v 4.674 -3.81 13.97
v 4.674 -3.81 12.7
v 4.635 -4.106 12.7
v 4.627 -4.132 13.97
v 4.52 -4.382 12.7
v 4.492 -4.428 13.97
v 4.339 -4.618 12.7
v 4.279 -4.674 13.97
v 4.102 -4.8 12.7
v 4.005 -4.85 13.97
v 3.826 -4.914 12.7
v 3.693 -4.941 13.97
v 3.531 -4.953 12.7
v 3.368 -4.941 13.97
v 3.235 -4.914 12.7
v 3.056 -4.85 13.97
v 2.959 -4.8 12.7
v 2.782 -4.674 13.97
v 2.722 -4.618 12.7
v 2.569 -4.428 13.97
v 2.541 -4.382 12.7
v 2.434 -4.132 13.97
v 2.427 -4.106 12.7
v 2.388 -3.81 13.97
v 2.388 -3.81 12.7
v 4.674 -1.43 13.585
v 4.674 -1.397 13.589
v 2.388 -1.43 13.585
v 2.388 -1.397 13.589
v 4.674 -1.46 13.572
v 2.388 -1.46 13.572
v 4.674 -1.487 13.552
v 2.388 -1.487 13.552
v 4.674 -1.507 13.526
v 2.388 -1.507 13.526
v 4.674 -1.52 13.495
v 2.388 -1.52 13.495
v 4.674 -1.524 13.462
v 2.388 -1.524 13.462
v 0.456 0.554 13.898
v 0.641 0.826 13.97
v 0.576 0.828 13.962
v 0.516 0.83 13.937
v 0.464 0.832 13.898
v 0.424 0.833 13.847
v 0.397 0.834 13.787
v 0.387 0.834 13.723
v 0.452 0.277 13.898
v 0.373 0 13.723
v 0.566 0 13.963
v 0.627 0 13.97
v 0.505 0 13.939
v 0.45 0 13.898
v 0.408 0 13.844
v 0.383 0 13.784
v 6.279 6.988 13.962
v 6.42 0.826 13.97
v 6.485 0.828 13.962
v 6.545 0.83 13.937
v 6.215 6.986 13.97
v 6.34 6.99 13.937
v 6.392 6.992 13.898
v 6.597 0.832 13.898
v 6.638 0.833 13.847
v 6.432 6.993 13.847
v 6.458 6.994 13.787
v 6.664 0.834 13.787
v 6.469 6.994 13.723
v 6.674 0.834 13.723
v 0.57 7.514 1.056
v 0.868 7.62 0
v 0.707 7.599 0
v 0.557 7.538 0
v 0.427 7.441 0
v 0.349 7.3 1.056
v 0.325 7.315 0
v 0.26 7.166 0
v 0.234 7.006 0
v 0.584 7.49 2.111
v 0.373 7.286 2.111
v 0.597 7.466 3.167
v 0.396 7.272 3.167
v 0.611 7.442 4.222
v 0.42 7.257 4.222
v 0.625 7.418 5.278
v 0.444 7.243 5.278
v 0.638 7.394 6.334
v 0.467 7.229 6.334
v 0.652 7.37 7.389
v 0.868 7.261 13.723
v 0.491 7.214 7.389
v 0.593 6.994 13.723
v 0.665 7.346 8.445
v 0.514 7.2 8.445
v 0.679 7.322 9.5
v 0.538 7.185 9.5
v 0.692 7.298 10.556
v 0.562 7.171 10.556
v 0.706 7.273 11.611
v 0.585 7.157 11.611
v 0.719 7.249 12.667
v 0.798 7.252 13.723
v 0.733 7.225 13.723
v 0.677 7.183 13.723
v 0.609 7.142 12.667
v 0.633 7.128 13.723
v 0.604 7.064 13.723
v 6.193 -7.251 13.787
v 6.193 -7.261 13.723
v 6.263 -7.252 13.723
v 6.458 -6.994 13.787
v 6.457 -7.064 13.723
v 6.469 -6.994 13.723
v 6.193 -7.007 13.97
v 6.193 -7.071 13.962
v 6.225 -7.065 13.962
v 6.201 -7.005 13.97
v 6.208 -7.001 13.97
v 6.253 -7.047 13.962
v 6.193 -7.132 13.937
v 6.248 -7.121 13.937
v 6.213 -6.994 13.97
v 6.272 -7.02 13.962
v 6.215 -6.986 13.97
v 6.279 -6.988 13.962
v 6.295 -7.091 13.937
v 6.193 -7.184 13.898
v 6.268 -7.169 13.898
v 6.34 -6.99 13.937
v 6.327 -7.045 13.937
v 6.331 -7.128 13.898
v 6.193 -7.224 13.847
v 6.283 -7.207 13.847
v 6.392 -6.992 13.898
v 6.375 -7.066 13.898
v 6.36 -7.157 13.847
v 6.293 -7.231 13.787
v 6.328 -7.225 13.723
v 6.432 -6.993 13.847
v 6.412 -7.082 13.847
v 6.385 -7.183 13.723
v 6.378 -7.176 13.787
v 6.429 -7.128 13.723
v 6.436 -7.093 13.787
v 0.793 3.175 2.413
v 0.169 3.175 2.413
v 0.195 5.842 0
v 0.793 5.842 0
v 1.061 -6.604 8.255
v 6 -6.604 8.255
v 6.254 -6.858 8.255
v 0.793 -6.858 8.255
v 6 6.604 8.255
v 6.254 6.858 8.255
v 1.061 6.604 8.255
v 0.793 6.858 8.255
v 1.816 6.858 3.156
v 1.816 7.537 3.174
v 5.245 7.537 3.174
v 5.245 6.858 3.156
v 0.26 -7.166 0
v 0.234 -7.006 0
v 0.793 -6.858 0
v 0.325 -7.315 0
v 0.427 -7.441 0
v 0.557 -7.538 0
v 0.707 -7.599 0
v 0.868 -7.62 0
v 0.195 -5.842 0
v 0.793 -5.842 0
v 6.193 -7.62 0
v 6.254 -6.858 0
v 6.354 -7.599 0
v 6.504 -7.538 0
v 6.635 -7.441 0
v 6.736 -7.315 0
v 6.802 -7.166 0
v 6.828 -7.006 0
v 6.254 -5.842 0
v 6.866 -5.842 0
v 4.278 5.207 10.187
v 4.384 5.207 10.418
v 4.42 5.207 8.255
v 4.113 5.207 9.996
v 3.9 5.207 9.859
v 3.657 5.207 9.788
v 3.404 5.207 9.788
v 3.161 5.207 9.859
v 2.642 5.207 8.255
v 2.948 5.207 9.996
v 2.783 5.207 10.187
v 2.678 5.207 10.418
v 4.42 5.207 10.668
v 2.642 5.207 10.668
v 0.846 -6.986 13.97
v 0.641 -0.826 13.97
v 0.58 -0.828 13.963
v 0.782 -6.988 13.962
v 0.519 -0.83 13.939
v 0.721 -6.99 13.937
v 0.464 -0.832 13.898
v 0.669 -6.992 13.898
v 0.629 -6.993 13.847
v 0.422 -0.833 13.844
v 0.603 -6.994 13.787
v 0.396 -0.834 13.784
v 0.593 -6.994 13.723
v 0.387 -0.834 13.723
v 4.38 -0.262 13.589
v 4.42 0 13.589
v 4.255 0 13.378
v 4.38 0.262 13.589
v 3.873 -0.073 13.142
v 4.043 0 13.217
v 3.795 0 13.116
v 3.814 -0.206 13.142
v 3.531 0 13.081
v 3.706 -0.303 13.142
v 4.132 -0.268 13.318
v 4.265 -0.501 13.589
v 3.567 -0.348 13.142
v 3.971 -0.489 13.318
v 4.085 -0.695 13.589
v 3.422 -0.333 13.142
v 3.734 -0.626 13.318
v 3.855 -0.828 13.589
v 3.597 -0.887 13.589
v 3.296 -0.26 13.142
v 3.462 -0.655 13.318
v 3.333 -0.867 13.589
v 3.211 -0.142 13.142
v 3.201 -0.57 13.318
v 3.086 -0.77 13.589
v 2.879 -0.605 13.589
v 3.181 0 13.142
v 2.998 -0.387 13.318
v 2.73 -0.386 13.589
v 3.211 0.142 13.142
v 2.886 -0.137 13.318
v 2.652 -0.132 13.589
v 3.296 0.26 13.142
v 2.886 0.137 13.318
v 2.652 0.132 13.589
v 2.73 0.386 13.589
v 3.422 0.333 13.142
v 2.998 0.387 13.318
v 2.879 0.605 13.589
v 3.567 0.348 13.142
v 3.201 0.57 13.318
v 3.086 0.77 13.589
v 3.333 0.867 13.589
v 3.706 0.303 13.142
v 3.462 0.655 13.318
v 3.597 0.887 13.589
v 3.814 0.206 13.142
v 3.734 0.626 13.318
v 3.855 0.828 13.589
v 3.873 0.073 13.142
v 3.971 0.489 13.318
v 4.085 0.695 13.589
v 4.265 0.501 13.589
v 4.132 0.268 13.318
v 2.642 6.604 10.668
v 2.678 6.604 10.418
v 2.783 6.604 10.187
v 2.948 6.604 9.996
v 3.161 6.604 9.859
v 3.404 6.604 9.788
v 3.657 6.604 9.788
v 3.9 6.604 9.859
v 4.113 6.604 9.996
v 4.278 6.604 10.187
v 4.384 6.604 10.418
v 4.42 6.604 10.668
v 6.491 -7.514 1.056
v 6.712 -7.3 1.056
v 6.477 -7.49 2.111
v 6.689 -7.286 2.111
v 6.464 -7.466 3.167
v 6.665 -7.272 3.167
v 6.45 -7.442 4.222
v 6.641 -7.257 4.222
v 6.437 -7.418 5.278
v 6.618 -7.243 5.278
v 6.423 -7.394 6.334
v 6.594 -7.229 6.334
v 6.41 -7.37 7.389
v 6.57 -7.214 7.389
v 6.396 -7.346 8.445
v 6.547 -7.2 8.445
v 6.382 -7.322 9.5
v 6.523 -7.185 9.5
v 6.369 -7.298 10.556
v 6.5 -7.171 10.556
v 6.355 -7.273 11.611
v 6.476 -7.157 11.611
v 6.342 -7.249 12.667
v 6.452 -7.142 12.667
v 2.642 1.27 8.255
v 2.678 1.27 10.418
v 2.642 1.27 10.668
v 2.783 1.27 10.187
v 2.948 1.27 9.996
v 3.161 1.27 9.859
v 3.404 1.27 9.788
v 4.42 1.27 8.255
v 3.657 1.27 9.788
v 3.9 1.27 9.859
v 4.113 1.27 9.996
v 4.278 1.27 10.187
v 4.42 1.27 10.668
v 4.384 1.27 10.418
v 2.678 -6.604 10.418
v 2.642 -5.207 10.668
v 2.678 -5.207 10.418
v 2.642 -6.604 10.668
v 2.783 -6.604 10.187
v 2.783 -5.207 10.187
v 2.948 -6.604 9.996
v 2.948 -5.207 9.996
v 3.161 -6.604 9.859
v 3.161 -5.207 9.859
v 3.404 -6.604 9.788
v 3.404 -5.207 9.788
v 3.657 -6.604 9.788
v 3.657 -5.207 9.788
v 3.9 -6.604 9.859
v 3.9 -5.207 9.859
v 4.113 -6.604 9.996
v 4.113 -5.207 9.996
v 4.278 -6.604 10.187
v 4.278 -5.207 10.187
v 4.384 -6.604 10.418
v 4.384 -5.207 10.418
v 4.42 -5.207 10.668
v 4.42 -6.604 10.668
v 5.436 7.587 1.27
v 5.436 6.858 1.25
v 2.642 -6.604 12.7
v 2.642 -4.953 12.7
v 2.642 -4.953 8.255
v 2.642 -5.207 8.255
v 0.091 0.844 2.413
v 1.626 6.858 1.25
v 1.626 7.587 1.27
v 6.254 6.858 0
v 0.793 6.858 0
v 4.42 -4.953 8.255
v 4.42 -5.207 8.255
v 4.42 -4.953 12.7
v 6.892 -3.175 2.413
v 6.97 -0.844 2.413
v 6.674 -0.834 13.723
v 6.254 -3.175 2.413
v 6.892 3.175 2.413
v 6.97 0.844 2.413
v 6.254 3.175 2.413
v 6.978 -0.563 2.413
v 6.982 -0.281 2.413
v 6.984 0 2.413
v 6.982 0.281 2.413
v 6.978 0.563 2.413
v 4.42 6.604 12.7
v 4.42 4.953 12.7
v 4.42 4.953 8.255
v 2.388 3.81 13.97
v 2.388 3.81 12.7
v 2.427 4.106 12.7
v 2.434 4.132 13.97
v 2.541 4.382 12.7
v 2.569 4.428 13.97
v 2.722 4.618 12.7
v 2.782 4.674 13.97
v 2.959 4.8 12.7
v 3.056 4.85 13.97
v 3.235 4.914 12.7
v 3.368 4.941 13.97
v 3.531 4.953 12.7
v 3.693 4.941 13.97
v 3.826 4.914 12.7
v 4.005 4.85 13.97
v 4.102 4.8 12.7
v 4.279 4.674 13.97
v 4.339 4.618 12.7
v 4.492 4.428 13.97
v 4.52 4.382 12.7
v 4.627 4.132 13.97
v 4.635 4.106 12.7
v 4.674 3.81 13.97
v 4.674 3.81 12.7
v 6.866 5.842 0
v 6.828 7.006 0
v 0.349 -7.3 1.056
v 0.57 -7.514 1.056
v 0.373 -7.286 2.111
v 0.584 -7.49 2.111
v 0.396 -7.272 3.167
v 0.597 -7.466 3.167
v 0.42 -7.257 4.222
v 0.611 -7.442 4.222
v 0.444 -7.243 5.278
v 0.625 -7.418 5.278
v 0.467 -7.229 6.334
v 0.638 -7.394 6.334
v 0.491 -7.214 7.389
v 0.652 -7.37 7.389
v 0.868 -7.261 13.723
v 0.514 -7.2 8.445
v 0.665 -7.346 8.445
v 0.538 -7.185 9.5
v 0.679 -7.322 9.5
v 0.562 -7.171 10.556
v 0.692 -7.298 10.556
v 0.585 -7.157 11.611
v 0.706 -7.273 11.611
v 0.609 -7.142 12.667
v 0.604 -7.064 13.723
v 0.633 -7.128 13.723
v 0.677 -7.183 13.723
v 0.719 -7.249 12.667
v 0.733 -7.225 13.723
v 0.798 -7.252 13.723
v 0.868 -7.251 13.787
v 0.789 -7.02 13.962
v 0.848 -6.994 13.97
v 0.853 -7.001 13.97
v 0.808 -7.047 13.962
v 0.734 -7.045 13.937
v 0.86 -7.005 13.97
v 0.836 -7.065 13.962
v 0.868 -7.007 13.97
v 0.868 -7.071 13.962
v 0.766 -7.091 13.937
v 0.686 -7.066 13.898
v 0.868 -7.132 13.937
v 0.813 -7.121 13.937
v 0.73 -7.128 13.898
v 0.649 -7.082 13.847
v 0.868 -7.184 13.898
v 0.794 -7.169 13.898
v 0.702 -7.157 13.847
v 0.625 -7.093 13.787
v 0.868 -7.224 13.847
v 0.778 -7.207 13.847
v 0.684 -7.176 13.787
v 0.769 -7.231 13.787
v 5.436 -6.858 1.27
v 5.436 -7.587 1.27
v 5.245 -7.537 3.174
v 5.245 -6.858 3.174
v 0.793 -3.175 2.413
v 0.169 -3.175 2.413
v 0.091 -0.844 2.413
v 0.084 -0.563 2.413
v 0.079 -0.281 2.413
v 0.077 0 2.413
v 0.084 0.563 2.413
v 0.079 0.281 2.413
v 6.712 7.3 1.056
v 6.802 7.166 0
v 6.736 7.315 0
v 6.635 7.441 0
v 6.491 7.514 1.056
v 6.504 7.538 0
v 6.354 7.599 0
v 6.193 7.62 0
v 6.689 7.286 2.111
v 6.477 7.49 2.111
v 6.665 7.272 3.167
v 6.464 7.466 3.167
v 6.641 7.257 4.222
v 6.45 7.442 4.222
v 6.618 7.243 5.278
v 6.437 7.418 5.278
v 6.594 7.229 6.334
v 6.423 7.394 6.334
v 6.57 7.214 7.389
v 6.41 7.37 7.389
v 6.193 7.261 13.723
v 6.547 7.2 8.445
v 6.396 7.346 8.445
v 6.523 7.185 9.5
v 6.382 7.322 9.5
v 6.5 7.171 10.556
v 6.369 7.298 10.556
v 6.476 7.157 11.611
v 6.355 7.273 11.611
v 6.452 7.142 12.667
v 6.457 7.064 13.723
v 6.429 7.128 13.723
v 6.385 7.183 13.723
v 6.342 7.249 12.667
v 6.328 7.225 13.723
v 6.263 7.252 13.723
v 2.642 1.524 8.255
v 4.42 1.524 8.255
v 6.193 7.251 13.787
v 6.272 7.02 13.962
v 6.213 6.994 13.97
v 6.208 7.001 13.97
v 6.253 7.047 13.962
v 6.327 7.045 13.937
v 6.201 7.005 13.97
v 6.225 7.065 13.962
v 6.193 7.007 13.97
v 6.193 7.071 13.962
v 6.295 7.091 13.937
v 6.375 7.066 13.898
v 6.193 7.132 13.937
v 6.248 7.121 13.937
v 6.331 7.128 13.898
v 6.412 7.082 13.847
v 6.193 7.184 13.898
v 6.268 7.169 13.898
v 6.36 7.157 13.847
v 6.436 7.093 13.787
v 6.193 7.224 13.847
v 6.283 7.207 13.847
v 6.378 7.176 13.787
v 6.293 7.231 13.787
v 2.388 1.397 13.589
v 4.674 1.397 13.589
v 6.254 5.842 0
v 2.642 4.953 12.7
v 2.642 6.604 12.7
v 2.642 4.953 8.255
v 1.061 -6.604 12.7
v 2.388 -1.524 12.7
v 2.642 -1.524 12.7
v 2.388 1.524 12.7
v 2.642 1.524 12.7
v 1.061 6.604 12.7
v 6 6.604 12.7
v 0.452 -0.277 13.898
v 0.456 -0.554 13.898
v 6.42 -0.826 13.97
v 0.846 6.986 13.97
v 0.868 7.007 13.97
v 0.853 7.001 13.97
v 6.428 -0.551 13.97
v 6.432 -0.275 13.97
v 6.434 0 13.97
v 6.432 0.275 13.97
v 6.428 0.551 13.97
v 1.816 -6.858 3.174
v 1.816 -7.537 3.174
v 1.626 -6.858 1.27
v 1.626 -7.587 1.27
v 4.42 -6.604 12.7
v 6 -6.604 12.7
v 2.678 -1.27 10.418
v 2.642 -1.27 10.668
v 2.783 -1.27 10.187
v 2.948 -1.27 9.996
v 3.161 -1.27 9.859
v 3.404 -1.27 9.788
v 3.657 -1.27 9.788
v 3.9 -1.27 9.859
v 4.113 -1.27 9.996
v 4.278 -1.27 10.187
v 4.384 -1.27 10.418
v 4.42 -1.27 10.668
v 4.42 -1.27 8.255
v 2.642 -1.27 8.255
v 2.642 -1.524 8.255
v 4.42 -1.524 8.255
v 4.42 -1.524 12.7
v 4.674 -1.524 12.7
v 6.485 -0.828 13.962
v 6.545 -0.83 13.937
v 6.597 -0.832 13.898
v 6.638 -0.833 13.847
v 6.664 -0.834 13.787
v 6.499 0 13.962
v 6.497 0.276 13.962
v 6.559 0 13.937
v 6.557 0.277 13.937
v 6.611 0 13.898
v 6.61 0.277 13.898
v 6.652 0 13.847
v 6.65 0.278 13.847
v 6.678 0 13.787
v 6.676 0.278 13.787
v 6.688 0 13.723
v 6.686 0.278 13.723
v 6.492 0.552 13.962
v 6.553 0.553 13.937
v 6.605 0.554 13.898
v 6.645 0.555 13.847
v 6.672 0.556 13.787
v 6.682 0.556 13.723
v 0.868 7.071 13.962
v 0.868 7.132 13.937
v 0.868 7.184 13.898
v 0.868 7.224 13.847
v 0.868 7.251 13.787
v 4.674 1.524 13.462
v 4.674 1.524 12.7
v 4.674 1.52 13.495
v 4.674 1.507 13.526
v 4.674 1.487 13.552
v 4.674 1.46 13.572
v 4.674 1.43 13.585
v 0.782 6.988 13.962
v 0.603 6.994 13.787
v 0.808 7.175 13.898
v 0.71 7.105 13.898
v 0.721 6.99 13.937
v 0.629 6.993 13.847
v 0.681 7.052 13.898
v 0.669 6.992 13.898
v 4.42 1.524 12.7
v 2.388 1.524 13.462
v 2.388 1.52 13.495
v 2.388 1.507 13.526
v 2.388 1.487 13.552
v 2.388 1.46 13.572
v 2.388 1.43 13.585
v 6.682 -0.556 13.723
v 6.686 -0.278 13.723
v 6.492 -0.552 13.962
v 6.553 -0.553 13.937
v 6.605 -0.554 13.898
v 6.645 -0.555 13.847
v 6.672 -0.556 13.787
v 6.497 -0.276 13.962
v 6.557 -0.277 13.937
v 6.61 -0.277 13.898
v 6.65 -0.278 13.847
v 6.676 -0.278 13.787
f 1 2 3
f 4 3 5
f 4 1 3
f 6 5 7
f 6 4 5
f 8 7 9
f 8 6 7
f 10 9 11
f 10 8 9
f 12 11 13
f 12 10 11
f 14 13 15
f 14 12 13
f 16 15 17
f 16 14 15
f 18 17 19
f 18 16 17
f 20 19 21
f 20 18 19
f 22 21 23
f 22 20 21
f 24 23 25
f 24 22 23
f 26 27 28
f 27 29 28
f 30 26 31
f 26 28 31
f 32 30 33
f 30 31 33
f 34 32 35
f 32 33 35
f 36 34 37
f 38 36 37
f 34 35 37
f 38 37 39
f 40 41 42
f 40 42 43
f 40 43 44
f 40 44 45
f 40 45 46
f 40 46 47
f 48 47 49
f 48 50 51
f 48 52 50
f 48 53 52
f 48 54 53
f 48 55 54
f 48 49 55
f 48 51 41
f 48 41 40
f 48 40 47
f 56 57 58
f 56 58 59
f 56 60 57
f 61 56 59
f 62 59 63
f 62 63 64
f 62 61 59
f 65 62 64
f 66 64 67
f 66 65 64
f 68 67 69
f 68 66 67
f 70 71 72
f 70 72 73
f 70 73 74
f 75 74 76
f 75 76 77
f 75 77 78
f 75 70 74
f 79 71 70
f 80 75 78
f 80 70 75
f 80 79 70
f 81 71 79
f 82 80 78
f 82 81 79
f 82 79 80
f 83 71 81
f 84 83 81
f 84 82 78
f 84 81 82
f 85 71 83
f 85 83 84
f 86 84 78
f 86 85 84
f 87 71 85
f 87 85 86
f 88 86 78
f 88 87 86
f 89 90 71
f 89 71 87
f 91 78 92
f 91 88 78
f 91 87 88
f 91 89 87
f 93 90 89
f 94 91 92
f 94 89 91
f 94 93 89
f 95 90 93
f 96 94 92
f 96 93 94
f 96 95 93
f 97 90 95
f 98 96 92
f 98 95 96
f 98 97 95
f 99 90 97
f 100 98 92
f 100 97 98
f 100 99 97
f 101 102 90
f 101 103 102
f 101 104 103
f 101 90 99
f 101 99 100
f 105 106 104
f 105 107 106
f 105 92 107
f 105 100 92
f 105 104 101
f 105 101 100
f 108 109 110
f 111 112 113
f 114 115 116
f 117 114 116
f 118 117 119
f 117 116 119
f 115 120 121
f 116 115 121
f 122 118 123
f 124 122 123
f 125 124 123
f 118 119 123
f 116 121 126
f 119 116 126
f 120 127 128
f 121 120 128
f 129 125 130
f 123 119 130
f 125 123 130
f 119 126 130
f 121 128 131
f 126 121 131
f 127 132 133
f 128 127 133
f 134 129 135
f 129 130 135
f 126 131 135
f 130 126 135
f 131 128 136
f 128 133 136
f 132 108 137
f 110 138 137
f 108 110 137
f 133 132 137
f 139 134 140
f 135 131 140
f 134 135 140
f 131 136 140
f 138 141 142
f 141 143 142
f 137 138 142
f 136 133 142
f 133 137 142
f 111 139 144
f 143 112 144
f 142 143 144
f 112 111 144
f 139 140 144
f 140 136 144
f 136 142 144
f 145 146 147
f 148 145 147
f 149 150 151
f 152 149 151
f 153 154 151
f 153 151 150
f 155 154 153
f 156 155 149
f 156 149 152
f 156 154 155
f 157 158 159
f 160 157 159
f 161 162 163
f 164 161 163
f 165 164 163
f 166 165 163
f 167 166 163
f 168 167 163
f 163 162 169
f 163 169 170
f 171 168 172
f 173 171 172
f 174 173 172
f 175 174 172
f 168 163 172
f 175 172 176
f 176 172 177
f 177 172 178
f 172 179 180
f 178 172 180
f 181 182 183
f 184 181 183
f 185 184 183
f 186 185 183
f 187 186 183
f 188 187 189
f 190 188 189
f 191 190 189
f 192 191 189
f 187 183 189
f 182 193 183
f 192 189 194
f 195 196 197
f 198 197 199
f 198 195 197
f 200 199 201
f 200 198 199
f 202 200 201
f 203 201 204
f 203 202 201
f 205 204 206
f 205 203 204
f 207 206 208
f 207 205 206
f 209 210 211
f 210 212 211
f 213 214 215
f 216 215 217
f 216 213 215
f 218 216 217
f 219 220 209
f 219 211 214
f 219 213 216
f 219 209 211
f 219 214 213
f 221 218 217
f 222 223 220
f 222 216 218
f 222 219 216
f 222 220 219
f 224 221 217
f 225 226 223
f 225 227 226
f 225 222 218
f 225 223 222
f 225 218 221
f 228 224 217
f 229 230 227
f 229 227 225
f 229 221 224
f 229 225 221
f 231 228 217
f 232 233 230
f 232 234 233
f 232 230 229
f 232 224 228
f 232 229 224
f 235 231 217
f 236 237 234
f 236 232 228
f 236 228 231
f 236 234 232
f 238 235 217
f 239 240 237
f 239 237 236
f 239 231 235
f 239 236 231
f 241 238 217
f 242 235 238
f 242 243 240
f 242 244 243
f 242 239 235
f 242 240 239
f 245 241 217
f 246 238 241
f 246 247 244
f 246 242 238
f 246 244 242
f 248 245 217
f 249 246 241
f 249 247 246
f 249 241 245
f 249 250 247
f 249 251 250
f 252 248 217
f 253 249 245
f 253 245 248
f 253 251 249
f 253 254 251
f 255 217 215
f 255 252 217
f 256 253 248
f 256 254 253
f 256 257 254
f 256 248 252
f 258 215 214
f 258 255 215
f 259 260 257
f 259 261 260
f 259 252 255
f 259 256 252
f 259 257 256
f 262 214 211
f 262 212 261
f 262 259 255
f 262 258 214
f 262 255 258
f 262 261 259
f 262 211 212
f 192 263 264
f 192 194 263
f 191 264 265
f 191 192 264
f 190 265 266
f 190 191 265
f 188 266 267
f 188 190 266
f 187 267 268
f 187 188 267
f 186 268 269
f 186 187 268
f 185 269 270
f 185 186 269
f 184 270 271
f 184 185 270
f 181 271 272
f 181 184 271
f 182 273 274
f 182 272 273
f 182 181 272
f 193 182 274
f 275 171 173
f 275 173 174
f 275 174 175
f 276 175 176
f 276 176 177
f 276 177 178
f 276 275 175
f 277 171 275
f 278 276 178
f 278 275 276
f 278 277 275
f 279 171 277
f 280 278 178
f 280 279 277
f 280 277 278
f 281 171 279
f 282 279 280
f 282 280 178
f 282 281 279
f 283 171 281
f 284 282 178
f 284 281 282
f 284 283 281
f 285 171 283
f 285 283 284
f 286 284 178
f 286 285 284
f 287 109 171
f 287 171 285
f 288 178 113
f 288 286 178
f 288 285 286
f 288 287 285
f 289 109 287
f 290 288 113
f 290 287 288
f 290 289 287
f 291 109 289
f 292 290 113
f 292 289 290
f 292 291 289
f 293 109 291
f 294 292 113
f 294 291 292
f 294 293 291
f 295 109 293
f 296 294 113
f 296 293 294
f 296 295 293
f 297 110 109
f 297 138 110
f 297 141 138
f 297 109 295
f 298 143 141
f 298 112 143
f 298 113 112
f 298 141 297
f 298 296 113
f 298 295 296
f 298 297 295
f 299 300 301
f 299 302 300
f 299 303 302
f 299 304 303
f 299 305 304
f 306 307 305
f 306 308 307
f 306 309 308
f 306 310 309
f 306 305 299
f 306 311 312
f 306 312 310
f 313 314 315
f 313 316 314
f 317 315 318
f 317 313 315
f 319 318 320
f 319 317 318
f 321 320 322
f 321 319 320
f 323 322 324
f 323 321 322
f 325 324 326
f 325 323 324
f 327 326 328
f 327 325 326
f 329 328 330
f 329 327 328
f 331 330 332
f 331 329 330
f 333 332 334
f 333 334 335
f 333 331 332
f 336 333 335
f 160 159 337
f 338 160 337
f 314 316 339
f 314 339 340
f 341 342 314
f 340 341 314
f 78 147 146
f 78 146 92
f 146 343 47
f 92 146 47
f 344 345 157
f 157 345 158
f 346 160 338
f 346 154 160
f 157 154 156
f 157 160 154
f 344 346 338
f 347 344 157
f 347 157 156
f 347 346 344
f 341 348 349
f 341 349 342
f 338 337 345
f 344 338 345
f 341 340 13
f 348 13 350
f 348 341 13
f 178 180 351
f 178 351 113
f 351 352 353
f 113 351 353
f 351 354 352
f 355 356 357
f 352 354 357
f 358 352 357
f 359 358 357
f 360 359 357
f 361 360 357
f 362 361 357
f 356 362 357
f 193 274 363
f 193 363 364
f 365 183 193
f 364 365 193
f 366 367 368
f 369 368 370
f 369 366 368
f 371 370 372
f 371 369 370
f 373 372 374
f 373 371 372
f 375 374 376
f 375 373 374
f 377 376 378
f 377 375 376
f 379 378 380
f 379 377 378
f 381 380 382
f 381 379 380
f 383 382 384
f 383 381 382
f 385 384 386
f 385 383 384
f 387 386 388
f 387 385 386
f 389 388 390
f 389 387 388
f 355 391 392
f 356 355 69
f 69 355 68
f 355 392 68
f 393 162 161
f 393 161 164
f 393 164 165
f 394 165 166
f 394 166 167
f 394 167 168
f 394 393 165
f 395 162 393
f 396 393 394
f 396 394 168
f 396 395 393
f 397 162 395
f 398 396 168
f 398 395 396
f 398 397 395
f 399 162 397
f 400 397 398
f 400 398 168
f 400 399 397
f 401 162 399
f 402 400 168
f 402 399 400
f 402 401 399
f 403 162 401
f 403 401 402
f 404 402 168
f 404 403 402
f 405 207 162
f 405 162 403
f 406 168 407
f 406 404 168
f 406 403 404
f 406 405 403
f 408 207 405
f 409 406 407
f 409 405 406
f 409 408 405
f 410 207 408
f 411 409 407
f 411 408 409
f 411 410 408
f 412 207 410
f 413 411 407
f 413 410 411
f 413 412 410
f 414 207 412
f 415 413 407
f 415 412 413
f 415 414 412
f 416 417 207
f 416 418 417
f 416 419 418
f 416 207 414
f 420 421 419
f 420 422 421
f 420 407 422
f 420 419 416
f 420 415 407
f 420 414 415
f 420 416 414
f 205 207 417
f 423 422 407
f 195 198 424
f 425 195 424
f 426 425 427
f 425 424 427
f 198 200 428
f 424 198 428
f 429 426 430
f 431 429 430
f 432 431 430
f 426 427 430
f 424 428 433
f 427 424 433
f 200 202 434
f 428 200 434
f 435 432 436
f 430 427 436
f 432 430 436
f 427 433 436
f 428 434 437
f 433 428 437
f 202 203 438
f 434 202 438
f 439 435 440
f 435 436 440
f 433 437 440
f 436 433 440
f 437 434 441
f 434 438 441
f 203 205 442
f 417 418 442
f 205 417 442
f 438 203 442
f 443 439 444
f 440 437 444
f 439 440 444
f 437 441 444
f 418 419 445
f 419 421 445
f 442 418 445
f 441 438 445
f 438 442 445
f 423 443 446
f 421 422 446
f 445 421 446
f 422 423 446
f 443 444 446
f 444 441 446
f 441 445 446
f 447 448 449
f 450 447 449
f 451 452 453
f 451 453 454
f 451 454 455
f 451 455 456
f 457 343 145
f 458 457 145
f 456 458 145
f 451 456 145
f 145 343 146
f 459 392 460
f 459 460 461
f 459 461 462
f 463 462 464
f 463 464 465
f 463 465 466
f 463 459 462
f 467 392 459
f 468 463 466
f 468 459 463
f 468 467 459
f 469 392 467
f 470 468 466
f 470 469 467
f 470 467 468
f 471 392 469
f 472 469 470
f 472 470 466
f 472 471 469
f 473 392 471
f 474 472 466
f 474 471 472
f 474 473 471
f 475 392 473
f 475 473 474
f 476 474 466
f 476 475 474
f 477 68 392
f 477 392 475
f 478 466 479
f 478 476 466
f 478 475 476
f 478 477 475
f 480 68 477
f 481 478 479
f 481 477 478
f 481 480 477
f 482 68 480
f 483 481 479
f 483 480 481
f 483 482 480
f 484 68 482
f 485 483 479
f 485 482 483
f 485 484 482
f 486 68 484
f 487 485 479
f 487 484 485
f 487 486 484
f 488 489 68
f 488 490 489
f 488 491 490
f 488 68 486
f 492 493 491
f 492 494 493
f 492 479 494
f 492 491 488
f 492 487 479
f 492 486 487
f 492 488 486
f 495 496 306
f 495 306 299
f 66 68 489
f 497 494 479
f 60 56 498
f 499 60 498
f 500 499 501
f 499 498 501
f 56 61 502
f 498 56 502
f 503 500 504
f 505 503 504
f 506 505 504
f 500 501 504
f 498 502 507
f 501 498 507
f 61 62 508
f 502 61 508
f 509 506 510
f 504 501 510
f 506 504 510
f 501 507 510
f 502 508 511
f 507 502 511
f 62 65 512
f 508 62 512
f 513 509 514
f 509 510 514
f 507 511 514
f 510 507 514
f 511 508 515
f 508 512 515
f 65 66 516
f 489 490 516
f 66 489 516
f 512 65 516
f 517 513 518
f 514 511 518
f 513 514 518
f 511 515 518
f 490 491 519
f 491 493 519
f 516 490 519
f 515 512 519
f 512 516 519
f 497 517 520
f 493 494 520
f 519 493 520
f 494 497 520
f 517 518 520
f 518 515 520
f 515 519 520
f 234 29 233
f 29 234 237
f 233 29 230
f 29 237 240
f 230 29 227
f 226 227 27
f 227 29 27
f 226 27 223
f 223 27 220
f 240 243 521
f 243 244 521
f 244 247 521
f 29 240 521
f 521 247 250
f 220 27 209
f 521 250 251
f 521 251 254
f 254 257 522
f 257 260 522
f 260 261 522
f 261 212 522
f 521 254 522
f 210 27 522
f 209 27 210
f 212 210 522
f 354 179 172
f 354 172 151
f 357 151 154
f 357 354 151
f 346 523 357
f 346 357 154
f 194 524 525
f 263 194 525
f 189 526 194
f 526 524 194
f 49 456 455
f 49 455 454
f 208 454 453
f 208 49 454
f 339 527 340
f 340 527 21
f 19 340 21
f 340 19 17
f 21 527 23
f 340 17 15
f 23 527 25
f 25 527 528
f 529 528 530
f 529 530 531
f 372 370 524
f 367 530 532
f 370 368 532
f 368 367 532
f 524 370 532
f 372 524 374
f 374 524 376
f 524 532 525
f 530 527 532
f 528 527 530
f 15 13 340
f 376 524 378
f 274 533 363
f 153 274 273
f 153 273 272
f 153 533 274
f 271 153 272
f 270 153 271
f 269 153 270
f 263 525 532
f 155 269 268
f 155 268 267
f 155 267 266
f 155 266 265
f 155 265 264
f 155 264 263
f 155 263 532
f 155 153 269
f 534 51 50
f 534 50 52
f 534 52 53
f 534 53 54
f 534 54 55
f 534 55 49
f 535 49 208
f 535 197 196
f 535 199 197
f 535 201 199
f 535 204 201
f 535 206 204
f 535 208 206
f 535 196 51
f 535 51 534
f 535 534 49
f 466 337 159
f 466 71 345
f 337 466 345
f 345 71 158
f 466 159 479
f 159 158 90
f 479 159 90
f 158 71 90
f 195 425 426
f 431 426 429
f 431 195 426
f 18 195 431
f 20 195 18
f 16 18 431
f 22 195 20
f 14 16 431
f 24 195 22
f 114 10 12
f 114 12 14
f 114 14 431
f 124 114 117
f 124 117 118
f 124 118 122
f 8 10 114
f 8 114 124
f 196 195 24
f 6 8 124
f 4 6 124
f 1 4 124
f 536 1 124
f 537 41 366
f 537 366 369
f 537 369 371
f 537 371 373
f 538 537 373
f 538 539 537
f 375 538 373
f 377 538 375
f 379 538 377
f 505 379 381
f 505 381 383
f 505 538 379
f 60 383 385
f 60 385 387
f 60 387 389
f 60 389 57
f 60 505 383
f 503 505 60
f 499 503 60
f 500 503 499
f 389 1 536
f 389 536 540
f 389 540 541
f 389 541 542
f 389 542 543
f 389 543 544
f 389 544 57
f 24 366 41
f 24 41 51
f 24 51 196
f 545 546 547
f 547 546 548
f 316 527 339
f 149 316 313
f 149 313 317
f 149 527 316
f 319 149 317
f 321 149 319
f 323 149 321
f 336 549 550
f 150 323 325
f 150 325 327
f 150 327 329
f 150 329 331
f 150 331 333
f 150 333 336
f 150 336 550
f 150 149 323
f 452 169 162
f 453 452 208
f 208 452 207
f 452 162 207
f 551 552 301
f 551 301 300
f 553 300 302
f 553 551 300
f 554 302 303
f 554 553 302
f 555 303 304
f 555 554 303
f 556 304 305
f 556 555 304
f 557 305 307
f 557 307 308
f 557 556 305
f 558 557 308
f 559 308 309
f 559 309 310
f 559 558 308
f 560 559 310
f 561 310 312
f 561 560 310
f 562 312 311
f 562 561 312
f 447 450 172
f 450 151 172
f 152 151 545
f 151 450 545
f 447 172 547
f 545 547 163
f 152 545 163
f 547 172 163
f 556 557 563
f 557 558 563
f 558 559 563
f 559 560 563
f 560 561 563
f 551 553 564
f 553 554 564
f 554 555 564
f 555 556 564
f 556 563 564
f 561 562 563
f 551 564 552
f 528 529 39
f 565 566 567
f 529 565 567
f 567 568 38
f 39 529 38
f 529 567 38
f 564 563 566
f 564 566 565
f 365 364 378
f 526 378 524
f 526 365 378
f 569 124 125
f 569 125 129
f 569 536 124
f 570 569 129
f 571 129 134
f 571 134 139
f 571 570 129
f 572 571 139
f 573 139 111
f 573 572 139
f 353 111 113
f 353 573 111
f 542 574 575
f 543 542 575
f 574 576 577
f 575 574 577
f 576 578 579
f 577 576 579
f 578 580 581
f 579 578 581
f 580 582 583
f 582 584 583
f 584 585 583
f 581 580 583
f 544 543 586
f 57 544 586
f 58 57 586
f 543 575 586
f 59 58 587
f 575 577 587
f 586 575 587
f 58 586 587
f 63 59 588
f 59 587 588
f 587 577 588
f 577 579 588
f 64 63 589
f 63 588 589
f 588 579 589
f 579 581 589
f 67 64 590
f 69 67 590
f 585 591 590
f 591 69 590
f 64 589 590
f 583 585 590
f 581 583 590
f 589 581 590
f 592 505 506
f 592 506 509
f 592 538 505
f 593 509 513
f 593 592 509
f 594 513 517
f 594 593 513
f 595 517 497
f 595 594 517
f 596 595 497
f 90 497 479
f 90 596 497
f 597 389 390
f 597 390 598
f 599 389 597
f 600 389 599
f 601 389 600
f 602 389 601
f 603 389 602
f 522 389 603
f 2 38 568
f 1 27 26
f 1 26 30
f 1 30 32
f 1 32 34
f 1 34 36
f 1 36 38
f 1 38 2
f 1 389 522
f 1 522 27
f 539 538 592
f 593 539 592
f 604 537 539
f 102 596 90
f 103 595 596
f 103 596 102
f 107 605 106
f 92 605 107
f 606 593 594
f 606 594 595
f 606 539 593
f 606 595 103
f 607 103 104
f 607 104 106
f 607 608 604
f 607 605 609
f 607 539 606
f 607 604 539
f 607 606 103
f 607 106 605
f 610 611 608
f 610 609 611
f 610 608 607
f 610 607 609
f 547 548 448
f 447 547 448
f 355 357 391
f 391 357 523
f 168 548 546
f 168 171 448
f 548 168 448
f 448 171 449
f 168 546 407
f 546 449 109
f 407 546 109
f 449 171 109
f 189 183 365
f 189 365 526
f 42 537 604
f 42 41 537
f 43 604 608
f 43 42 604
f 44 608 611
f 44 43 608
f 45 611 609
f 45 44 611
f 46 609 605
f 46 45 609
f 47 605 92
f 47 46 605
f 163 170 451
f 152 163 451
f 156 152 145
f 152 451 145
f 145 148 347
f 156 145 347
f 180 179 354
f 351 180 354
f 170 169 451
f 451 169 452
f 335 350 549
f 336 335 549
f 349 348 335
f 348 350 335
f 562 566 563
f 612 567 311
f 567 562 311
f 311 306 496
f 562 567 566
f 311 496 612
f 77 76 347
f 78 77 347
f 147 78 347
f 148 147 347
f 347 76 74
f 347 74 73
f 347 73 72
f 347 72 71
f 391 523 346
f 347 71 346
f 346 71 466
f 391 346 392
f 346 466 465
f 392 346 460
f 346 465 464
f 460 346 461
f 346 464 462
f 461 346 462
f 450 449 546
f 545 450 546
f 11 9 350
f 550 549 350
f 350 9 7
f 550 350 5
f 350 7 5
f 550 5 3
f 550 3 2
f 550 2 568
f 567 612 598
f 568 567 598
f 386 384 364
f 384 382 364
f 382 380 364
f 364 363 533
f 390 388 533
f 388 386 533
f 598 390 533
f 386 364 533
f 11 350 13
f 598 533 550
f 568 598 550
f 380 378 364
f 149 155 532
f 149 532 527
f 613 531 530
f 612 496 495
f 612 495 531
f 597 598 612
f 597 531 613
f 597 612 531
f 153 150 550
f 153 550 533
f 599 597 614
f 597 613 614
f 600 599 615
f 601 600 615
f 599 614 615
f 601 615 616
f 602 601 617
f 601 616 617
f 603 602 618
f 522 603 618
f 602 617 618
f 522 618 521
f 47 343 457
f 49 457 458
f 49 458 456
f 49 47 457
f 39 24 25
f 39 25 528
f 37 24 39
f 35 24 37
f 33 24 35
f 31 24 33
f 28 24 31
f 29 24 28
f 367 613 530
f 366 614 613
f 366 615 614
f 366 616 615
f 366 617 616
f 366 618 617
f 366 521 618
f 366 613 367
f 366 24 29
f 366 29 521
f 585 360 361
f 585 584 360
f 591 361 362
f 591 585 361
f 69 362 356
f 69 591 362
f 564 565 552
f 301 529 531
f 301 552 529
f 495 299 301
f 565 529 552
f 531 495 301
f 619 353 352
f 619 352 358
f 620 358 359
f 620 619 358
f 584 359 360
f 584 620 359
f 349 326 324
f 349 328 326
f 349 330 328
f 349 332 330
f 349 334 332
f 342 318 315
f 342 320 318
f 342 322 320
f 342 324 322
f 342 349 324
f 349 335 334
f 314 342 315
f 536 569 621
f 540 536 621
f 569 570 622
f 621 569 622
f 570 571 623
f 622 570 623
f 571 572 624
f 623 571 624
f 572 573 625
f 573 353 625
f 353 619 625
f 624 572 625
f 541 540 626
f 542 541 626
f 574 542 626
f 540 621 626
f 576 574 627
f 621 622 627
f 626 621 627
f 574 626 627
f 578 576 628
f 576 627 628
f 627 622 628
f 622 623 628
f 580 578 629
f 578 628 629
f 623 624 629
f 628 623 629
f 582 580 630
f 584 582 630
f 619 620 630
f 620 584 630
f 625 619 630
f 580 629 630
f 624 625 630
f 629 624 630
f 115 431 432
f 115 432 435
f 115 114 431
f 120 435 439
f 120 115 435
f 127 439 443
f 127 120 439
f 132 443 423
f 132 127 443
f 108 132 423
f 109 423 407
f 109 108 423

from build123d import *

# Parameters (mm, degrees)
BOSS_EXTRUDE1_DEPTH = 13.97
BOSS_EXTRUDE1_TAPER = 1.5
SKETCH2_W           = 5.461
SKETCH2_H           = 13.716
CUT_EXTRUDE1_DEPTH  = 8.255
CUT_EXTRUDE2_DEPTH  = 18.403644698
SKETCH5_W           = 5.334
SKETCH5_H           = 3.048
BOSS_EXTRUDE2_DEPTH = 2.286
SKETCH7_W           = 1.778
SKETCH7_H           = 3.048
CUT_EXTRUDE5_DEPTH  = 4.445
SKETCH9_W           = 1.778
SKETCH9_H           = 2.54
SKETCH9_H_2         = 1.397
CUT_EXTRUDE6_DEPTH  = 1.524
FILLET2_RADIUS      = 0.889
FILLET2_LENGTH      = 1.397
FILLET3_RADIUS      = 0.889
FILLET3_LENGTH      = 2.54
FILLET4_RADIUS      = 0.889
FILLET4_LENGTH      = 1.397
FILLET5_R           = 0.254
FILLET6_R           = 0.127
CUT_EXTRUDE7_REACH  = 23.72
CUT_EXTRUDE8_REACH  = 23.712
CUT_EXTRUDE10_DEPTH = 18.403644779


with BuildPart() as part:
    # Sketch1 → Boss-Extrude1 (new body)
    with BuildSketch(Plane.XY):
        with BuildLine():
            ThreePointArc((6.827680219, 7.006153229), (6.634503314, 7.441430334), (6.193032647, 7.62))
            Line((6.193032647, 7.62), (0.868167353, 7.62))
            ThreePointArc((0.868167353, 7.62), (0.426696686, 7.441430334), (0.233519781, 7.006153229))
            Line((0.233519781, 7.006153229), (0.028202051, 0.84612915))
            ThreePointArc((0.028202051, 0.84612915), (0.017629462, 0.423123288), (0.01410494, 0))
            ThreePointArc((0.01410494, 0), (0.017629462, -0.423123288), (0.028202051, -0.84612915))
            Line((0.028202051, -0.84612915), (0.233519781, -7.006153229))
            ThreePointArc((0.233519781, -7.006153229), (0.426696686, -7.441430334), (0.868167353, -7.62))
            Line((0.868167353, -7.62), (6.193032647, -7.62))
            ThreePointArc((6.193032647, -7.62), (6.634503314, -7.441430334), (6.827680219, -7.006153229))
            Line((6.827680219, -7.006153229), (7.032997949, -0.84612915))
            ThreePointArc((7.032997949, -0.84612915), (7.043570538, -0.423123288), (7.04709506, 0))
            ThreePointArc((7.04709506, 0), (7.043570538, 0.423123288), (7.032997949, 0.84612915))
            Line((7.032997949, 0.84612915), (6.827680219, 7.006153229))
        make_face()
    extrude(amount=BOSS_EXTRUDE1_DEPTH, taper=BOSS_EXTRUDE1_TAPER)

    # Sketch2 → Cut-Extrude1 (cut)
    with BuildSketch(Plane(origin=(0, 0, 0), x_dir=(-1, 0, 0), z_dir=(0, 0, -1))):
        with Locations((-3.52354753, 0)):
            Rectangle(SKETCH2_W, SKETCH2_H)
    extrude(amount=-CUT_EXTRUDE1_DEPTH, mode=Mode.SUBTRACT)

    # Sketch3 → Cut-Extrude2 (cut, through all)
    with BuildSketch(Plane.XY.offset(13.97)):
        with BuildLine():
            Line((4.6736, 3.81), (4.6736, -3.81))
            ThreePointArc((4.6736, -3.81), (3.5306, -4.953), (2.3876, -3.81))
            Line((2.3876, -3.81), (2.3876, 3.81))
            ThreePointArc((2.3876, 3.81), (3.5306, 4.953), (4.6736, 3.81))
        make_face()
    extrude(amount=-CUT_EXTRUDE2_DEPTH, mode=Mode.SUBTRACT)

    # Sketch5 → Boss-Extrude2 (add)
    with BuildSketch(Plane.ZY.offset(-4.6736)):
        with Locations((10.922, 0)):
            Rectangle(SKETCH5_W, SKETCH5_H)
    extrude(amount=BOSS_EXTRUDE2_DEPTH)

    # Sketch6 → Cut-Revolve1 (revolve, cut)
    with BuildSketch(Plane(origin=(0, 0, 0), x_dir=(1, 0, 0), z_dir=(0, 1, 0)), mode=Mode.PRIVATE) as cut_revolve1_sk:
        with BuildLine():
            Line((3.5306, -13.589), (3.5306, -13.081))
            ThreePointArc((3.5306, -13.081), (3.018646633, -13.216956608), (2.6416, -13.589))
            Line((2.6416, -13.589), (3.5306, -13.589))
        make_face()
    revolve(cut_revolve1_sk.sketch.rotate(Axis((3.5306, 0, 13.589), (0, 0, -1)), 180), axis=Axis((3.5306, 0, 13.589), (0, 0, -1)), mode=Mode.SUBTRACT)

    # Sketch7 → Cut-Extrude5 (cut)
    with BuildSketch(Plane(origin=(0, 0, 8.255), x_dir=(-1, 0, 0), z_dir=(0, 0, -1))):
        Polygon((-1.06115247, -6.604), (-2.6416, -6.604), (-2.6416, -4.953), (-4.4196, -4.953), (-4.4196, -6.604), (-6.00004753, -6.604), (-6.00004753, 6.604), (-4.4196, 6.604), (-4.4196, 4.953), (-2.6416, 4.953), (-2.6416, 6.604), (-1.06115247, 6.604), align=None)
        with Locations((-3.5306, 0)):
            Rectangle(SKETCH7_W, SKETCH7_H, mode=Mode.SUBTRACT)
    extrude(amount=-CUT_EXTRUDE5_DEPTH, mode=Mode.SUBTRACT)

    # Sketch9 → Cut-Extrude6 (cut)
    with BuildSketch(Plane(origin=(0, 0, 8.255), x_dir=(-1, 0, 0), z_dir=(0, 0, -1))):
        with Locations((-3.5306, 0)):
            Rectangle(SKETCH9_W, SKETCH9_H)
        with Locations((-3.5306, 5.9055)):
            Rectangle(SKETCH9_W, SKETCH9_H_2)
        with Locations((-3.5306, -5.9055)):
            Rectangle(SKETCH9_W, SKETCH9_H_2)
    extrude(amount=-CUT_EXTRUDE6_DEPTH, mode=Mode.SUBTRACT)

    # Fillet2: full round fillet: the end face becomes a half cylinder, R = half its width
    fillet2_face = Plane((3.5306, -5.9055, 9.779), x_dir=(0, -1, 0), z_dir=(0, 0, -1))  # on the end face: x along it, z out of the body
    fillet2_slab = fillet2_face.offset(-FILLET2_RADIUS / 2) * Box(FILLET2_LENGTH, 2 * FILLET2_RADIUS, FILLET2_RADIUS, mode=Mode.PRIVATE)  # the body's end, R deep
    fillet2_round = Plane((3.5306, -5.9055, 10.668), x_dir=(0, 0, -1), z_dir=(0, -1, 0)) * Cylinder(FILLET2_RADIUS, FILLET2_LENGTH, mode=Mode.PRIVATE)  # its axis R under the face
    add(fillet2_slab - fillet2_round, mode=Mode.SUBTRACT)

    # Fillet3: full round fillet: the end face becomes a half cylinder, R = half its width
    fillet3_face = Plane((3.5306, 0, 9.779), x_dir=(0, -1, 0), z_dir=(0, 0, -1))  # on the end face: x along it, z out of the body
    fillet3_slab = fillet3_face.offset(-FILLET3_RADIUS / 2) * Box(FILLET3_LENGTH, 2 * FILLET3_RADIUS, FILLET3_RADIUS, mode=Mode.PRIVATE)  # the body's end, R deep
    fillet3_round = Plane((3.5306, 0, 10.668), x_dir=(0, 0, -1), z_dir=(0, -1, 0)) * Cylinder(FILLET3_RADIUS, FILLET3_LENGTH, mode=Mode.PRIVATE)  # its axis R under the face
    add(fillet3_slab - fillet3_round, mode=Mode.SUBTRACT)

    # Fillet4: full round fillet: the end face becomes a half cylinder, R = half its width
    fillet4_face = Plane((3.5306, 5.9055, 9.779), x_dir=(0, -1, 0), z_dir=(0, 0, -1))  # on the end face: x along it, z out of the body
    fillet4_slab = fillet4_face.offset(-FILLET4_RADIUS / 2) * Box(FILLET4_LENGTH, 2 * FILLET4_RADIUS, FILLET4_RADIUS, mode=Mode.PRIVATE)  # the body's end, R deep
    fillet4_round = Plane((3.5306, 5.9055, 10.668), x_dir=(0, 0, -1), z_dir=(0, -1, 0)) * Cylinder(FILLET4_RADIUS, FILLET4_LENGTH, mode=Mode.PRIVATE)  # its axis R under the face
    add(fillet4_slab - fillet4_round, mode=Mode.SUBTRACT)

    # Fillet5
    fillet5_edges = [part.edges().sort_by_distance(p)[0] for p in [
        (0.681023644, 7.178485258, 13.97),
        (0.49647521, 3.91395502, 13.97),
        (0.383396026, 0.417029358, 13.97),
        (0.49647521, -3.91395502, 13.97),
        (0.681023644, -7.178485258, 13.97),
        (3.5306, -7.254182676, 13.97),
        (6.380176356, -7.178485258, 13.97),
        (6.56472479, -3.91395502, 13.97),
        (6.677803974, -0.417029358, 13.97),
        (6.380176356, 7.178485258, 13.97),
        (6.56472479, 3.91395502, 13.97),
        (3.5306, 7.254182676, 13.97),
    ]]
    fillet(fillet5_edges, radius=FILLET5_R)

    # Fillet6
    fillet6_edges = [part.edges().sort_by_distance(p)[0] for p in [
        (3.5306, -1.524, 13.589),
        (3.5306, 1.524, 13.589),
    ]]
    fillet(fillet6_edges, radius=FILLET6_R)

    # Cut-Extrude7: up to this plane
    cut_extrude7_end = Plane(origin=(6.25404753, -6.858, 28.733169612), z_dir=(0, -1, 0))
    # Sketch10 → Cut-Extrude7 (cut, up to the surface)
    with BuildSketch(Plane(origin=(0, -7.614778527, 0.199399993), x_dir=(-1, 0, 0), z_dir=(0, -0.9996573249755574, 0.026176948307873222)), mode=Mode.PRIVATE) as cut_extrude7_sk1:
        Polygon((-1.6256, -1.070531654), (-5.4356, -1.070531654), (-5.2451, -2.975531654), (-1.8161, -2.975531654), align=None)
    cut_extrude7_tool1 = split(extrude(cut_extrude7_sk1.sketch, amount=CUT_EXTRUDE7_REACH, dir=(0, 1, 0), mode=Mode.PRIVATE), bisect_by=cut_extrude7_end, keep=Keep.BOTH, mode=Mode.PRIVATE)
    add(cut_extrude7_tool1.solids().sort_by_distance((3.5306, -7.562259, 2.205034))[0], mode=Mode.SUBTRACT)

    # Cut-Extrude8: up to this plane
    cut_extrude8_end = Plane(origin=(6.25404753, 6.858, 28.733169612), z_dir=(0, 1, 0))
    # Sketch12 → Cut-Extrude8 (cut, up to the surface)
    with BuildSketch(Plane(origin=(0, 7.614778527, 0.199399993), x_dir=(1, 0, 0), z_dir=(0, 0.9996573249755574, 0.026176948307873222)), mode=Mode.PRIVATE) as cut_extrude8_sk1:
        Polygon((5.4356, -1.070531654), (1.6256, -1.070531654), (1.8161, -2.975531654), (5.2451, -2.975531654), align=None)
    cut_extrude8_tool1 = split(extrude(cut_extrude8_sk1.sketch, amount=-CUT_EXTRUDE8_REACH, mode=Mode.PRIVATE), bisect_by=cut_extrude8_end, keep=Keep.BOTH, mode=Mode.PRIVATE)
    add(cut_extrude8_tool1.solids().sort_by_distance((3.5306, 7.562259, 2.205034))[0], mode=Mode.SUBTRACT)

    # Sketch13 → Cut-Extrude10 (cut, through all)
    with BuildSketch(Plane(origin=(0, 0, 0), x_dir=(0, 0, -1), z_dir=(1, 0, 0))):
        Polygon((0, 5.842), (0, -5.842), (-2.413, -3.175), (-2.413, 3.175), align=None)
    extrude(amount=CUT_EXTRUDE10_DEPTH, mode=Mode.SUBTRACT)


solid = part.part
